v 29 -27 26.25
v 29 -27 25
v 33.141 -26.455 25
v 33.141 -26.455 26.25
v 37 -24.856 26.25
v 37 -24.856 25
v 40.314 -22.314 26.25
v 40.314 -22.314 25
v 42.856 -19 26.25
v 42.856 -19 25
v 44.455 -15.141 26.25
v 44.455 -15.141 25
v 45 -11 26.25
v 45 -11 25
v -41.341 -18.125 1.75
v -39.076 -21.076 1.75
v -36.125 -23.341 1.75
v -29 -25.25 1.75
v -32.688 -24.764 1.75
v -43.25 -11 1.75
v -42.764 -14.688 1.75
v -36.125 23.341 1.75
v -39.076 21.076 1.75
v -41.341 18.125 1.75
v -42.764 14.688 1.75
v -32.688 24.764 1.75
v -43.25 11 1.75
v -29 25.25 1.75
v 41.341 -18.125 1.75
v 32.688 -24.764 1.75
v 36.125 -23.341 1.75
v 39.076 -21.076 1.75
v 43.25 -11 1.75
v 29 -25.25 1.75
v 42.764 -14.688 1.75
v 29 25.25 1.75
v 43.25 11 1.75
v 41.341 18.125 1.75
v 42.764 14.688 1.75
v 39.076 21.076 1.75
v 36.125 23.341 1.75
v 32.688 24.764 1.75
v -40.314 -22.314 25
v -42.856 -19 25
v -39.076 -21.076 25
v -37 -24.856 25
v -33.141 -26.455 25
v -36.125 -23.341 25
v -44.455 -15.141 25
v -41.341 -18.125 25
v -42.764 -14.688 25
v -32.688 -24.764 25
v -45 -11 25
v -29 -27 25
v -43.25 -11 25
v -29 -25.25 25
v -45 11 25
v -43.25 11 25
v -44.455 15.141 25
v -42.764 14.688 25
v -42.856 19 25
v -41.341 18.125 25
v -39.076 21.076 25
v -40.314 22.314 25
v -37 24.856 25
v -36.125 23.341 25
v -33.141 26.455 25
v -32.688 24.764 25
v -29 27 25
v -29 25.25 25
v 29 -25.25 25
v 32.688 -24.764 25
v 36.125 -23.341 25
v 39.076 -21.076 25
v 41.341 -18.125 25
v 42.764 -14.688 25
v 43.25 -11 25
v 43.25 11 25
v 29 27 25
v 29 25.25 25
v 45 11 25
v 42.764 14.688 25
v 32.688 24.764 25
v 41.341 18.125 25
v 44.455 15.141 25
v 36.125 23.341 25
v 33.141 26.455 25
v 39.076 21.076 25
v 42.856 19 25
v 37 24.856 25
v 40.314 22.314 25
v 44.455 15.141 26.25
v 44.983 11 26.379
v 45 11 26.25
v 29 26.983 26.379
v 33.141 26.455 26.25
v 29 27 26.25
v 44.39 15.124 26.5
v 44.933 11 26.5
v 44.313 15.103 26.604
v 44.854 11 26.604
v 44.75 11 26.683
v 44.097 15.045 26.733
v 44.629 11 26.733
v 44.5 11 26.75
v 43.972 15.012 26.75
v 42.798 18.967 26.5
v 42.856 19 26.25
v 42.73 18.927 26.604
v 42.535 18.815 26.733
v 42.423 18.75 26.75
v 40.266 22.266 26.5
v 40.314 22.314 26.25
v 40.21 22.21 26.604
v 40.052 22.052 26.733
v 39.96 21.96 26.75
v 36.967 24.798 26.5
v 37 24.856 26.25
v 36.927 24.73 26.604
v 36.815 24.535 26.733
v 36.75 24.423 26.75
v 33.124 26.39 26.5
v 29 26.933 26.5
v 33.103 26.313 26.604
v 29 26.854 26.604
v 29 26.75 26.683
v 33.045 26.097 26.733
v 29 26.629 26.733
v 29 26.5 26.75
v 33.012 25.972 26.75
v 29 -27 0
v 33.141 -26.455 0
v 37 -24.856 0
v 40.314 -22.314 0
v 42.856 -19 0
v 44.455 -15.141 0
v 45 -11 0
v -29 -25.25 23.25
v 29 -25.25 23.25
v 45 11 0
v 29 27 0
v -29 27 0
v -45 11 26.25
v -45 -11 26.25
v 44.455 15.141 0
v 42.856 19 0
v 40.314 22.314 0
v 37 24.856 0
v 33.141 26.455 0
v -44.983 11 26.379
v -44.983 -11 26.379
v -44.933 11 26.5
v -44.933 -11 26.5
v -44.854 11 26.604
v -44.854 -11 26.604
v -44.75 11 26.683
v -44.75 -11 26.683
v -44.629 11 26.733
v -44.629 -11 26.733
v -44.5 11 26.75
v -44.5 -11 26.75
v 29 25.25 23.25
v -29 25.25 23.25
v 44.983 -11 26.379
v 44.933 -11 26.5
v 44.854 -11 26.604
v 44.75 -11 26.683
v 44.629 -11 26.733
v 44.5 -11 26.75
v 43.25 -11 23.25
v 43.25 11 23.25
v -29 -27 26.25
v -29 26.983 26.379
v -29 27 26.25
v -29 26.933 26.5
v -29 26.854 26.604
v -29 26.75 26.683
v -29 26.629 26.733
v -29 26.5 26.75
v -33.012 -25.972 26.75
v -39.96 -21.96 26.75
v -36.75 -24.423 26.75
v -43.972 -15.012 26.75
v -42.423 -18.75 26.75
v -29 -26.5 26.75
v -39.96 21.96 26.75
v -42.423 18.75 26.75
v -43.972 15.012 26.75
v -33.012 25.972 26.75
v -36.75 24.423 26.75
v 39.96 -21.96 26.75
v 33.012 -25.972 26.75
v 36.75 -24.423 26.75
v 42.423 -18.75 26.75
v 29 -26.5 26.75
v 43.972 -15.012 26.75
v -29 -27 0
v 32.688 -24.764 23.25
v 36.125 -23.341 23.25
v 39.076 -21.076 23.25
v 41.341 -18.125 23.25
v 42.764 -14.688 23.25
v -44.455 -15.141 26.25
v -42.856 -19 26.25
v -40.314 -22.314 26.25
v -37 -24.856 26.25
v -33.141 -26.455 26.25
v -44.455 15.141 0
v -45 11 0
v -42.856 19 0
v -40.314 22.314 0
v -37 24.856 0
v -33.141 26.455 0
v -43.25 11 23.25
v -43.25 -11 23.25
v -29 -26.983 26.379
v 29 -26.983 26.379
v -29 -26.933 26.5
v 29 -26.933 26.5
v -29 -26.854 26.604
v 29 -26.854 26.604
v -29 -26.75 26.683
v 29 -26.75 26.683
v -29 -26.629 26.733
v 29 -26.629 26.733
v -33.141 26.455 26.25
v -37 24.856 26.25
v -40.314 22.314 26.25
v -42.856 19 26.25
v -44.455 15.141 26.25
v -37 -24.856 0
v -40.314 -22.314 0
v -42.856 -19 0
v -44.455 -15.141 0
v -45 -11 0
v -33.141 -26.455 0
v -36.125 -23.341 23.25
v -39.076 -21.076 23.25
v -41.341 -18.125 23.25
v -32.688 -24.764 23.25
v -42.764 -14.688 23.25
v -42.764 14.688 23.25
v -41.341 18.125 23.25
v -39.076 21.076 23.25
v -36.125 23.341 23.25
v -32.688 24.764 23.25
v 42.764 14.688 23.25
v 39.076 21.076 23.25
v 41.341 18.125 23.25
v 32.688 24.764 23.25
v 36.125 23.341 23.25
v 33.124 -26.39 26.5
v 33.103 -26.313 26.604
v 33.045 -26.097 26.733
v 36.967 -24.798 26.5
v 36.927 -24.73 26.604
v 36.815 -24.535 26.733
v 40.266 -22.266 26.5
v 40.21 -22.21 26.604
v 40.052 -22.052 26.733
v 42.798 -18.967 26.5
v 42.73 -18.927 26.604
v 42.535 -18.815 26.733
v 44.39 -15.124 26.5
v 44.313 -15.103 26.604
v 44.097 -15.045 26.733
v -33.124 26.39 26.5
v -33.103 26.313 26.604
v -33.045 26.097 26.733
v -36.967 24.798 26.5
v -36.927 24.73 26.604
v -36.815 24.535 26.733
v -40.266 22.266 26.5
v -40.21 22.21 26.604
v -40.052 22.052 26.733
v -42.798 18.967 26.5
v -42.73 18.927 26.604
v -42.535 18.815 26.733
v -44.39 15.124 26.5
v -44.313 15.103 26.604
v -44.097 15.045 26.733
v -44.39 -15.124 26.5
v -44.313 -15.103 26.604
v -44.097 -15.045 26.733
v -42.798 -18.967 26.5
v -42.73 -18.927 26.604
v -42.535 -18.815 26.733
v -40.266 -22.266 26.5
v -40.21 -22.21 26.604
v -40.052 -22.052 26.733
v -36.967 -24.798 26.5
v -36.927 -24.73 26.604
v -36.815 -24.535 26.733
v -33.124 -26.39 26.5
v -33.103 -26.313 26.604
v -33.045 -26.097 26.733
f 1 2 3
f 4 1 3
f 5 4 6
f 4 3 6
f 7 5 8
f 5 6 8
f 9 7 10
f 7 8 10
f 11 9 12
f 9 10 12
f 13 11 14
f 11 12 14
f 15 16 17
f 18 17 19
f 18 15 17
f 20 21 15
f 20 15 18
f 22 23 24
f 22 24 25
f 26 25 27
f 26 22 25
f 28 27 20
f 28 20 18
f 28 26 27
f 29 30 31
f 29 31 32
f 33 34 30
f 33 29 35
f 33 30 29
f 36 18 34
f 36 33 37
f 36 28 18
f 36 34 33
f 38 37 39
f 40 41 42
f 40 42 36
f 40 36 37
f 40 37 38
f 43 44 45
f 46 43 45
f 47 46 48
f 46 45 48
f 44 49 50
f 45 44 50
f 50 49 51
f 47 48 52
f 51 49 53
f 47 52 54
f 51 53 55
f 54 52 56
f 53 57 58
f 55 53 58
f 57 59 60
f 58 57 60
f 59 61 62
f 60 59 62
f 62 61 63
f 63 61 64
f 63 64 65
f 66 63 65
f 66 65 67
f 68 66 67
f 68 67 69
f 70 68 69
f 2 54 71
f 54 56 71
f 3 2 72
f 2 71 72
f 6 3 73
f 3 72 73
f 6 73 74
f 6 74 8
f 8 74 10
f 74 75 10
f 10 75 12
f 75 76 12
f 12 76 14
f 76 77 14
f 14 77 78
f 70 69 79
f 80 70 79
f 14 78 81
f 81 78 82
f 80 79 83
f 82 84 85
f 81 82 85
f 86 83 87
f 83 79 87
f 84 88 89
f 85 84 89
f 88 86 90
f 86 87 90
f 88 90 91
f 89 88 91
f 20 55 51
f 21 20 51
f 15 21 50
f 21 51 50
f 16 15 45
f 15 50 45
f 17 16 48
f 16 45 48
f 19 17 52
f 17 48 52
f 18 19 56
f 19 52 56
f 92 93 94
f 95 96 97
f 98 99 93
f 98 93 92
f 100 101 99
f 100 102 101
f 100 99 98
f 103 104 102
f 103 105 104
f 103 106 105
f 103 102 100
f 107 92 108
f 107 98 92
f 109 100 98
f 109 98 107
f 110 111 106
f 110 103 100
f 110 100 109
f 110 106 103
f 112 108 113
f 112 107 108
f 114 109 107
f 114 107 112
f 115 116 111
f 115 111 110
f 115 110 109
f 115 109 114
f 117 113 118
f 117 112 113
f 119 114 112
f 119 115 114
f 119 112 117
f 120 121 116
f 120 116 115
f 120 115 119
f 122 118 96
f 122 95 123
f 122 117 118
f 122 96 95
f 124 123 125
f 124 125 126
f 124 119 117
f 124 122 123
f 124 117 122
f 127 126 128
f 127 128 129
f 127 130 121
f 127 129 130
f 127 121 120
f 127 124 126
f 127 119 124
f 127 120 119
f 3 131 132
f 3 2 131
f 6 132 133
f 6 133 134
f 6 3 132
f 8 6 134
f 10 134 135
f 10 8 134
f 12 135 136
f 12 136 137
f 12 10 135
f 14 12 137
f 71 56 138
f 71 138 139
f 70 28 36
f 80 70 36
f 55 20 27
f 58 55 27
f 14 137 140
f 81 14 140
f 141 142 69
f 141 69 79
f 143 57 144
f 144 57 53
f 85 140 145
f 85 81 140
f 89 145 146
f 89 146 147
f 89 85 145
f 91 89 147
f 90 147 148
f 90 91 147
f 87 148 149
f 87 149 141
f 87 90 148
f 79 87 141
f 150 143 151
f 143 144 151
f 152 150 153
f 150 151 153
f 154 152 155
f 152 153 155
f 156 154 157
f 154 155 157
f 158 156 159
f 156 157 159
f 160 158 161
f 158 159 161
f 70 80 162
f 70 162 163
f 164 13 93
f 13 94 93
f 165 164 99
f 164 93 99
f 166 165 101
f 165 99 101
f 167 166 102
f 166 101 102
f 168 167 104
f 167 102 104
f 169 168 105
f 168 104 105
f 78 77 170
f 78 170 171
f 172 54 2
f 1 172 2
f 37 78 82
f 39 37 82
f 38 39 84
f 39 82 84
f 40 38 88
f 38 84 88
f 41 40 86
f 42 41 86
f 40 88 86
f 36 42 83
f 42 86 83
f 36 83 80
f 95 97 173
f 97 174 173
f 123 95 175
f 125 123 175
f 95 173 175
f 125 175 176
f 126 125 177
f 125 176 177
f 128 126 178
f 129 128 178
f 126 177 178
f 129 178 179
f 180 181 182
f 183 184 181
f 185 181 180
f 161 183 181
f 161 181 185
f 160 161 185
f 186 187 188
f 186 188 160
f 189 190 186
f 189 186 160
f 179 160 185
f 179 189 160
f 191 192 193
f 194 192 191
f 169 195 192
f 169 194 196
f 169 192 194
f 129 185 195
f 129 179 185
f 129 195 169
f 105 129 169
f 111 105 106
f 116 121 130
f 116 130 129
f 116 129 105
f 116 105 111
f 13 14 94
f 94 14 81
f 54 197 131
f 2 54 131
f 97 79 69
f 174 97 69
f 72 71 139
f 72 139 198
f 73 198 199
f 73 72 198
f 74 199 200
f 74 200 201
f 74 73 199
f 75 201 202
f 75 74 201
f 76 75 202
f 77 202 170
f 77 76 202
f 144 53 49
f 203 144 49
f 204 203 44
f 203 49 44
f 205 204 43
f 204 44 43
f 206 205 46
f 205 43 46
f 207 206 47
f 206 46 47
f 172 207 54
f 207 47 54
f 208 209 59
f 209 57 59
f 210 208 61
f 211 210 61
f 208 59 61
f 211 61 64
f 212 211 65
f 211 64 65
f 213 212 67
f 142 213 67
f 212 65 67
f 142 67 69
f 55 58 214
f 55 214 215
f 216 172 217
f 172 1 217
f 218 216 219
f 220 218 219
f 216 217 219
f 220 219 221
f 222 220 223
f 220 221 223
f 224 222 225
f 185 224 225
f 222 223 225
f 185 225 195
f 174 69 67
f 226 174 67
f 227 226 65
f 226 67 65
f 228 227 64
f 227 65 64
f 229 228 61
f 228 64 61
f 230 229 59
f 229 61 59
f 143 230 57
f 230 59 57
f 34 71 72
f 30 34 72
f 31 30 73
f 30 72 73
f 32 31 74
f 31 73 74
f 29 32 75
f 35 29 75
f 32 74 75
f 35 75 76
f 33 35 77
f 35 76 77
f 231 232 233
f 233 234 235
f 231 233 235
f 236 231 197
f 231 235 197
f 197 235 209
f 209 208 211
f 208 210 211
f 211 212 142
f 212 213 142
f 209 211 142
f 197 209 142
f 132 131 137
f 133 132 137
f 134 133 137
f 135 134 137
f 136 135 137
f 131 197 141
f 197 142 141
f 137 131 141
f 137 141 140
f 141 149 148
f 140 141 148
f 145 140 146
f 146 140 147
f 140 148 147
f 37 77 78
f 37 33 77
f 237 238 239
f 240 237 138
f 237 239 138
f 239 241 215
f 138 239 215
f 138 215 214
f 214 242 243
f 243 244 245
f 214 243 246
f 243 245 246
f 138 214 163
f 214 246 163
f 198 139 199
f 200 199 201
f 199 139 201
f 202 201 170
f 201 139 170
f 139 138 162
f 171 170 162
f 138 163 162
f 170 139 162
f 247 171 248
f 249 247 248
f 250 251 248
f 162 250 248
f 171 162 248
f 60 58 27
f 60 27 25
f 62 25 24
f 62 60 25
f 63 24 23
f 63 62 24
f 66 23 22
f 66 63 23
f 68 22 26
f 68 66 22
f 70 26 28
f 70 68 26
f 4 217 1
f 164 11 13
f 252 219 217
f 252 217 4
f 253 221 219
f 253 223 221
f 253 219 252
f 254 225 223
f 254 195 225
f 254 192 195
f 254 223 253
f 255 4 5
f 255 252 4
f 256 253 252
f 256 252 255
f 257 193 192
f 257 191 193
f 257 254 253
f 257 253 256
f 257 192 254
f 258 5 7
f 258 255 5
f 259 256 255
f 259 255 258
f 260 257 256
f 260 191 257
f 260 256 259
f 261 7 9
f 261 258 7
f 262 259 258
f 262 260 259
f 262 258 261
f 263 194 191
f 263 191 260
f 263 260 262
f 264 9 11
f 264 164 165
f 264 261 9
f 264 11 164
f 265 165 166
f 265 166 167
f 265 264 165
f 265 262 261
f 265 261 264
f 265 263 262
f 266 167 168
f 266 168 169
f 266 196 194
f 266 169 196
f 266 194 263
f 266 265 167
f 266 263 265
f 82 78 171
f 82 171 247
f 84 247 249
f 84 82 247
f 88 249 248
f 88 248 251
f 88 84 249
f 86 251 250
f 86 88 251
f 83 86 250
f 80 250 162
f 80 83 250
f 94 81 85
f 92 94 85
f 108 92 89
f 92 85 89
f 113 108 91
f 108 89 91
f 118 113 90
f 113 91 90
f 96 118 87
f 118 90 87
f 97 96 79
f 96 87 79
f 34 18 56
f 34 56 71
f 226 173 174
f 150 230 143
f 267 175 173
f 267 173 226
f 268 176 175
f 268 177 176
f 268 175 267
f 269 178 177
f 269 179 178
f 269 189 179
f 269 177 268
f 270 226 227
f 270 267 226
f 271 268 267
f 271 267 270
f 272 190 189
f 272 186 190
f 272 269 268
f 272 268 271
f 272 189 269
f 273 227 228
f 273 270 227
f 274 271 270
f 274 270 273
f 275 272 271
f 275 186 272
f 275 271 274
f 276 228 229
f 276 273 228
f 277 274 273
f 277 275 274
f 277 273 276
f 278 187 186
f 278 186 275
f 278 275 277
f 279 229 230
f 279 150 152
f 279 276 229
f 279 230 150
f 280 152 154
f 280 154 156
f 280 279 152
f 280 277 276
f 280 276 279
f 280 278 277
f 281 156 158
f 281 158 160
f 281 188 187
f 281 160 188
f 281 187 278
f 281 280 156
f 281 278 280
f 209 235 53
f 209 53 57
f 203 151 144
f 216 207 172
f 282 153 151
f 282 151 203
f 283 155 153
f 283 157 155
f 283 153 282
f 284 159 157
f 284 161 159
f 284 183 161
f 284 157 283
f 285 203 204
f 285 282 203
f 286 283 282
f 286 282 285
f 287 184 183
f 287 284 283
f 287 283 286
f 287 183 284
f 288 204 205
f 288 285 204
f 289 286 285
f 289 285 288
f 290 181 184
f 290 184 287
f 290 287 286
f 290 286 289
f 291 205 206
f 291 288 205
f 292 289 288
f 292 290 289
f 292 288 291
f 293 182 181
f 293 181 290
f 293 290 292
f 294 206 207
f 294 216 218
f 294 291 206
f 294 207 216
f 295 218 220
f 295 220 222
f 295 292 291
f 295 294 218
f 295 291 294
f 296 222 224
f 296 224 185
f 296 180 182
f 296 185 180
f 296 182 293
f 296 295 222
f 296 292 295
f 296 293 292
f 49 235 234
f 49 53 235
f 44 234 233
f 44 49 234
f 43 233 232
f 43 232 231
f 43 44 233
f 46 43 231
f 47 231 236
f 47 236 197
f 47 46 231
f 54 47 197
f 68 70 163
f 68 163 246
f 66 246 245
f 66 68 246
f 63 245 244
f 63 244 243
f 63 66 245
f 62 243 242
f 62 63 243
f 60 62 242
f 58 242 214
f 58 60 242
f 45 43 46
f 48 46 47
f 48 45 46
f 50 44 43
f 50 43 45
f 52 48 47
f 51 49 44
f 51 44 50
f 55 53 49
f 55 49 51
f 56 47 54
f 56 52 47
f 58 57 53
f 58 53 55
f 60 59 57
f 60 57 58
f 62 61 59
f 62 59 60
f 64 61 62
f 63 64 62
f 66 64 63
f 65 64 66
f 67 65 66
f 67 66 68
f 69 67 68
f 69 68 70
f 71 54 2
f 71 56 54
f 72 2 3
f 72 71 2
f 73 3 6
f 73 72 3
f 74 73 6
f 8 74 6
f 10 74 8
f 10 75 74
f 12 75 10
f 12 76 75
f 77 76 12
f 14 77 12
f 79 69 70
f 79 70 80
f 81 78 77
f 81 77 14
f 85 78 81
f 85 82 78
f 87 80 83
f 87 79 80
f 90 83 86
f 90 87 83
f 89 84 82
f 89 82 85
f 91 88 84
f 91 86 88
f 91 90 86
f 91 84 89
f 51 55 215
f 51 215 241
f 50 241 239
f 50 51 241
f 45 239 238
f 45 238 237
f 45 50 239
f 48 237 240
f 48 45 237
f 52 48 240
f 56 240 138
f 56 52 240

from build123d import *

# Parameters (mm, degrees)
F0_W     = 90
F0_H     = 54
F1_DEPTH = 25
F2_R     = 16
F3_T     = -1.75
F5_DEPTH = 1.75
F6_DEPTH = 1.75
F7_R     = 0.5


with BuildPart() as f1:
    # F0 (on Top) → F1 (new body)
    with BuildSketch(Plane.XY):
        Rectangle(F0_W, F0_H)
    extrude(amount=F1_DEPTH)

    # F2
    f2_edges = [f1.edges().sort_by_distance(p)[0] for p in [
        (-45, -27, 12.5),
        (45, -27, 12.5),
        (45, 27, 12.5),
        (-45, 27, 12.5),
    ]]
    fillet(f2_edges, radius=F2_R)

    # F3
    f3_openings = [f1.faces().sort_by_distance(p)[0] for p in [
        (0, 0, 25),
    ]]
    offset(amount=F3_T, openings=f3_openings)


with BuildPart() as f5:
    # F4 (on face) → F5 (new body)
    with BuildSketch(Plane.XY.offset(25)):
        with BuildLine():
            Line((-43.25, 11), (-43.25, -11))
            ThreePointArc((-43.25, -11), (-39.0762716319, -21.0762716319), (-29, -25.25))
            Line((-29, -25.25), (29, -25.25))
            ThreePointArc((29, -25.25), (39.0762716319, -21.0762716319), (43.25, -11))
            Line((43.25, -11), (43.25, 11))
            ThreePointArc((43.25, 11), (39.0762716319, 21.0762716319), (29, 25.25))
            Line((29, 25.25), (-29, 25.25))
            ThreePointArc((-29, 25.25), (-39.0762716319, 21.0762716319), (-43.25, 11))
        make_face()
    extrude(amount=-F5_DEPTH)

    # F4 (on face) → F6 (join)
    with BuildSketch(Plane.XY.offset(25)):
        with BuildLine():
            Line((-29, -27), (29, -27))
            ThreePointArc((29, -27), (40.313708499, -22.313708499), (45, -11))
            Line((45, -11), (45, 11))
            ThreePointArc((45, 11), (40.313708499, 22.313708499), (29, 27))
            Line((29, 27), (-29, 27))
            ThreePointArc((-29, 27), (-40.313708499, 22.313708499), (-45, 11))
            Line((-45, 11), (-45, -11))
            ThreePointArc((-45, -11), (-40.313708499, -22.313708499), (-29, -27))
        make_face()
        with BuildLine():
            ThreePointArc((-29, -25.25), (-39.0762716319, -21.0762716319), (-43.25, -11))
            Line((-43.25, -11), (-43.25, 11))
            ThreePointArc((-43.25, 11), (-39.0762716319, 21.0762716319), (-29, 25.25))
            Line((-29, 25.25), (29, 25.25))
            ThreePointArc((29, 25.25), (39.0762716319, 21.0762716319), (43.25, 11))
            Line((43.25, 11), (43.25, -11))
            ThreePointArc((43.25, -11), (39.0762716319, -21.0762716319), (29, -25.25))
            Line((29, -25.25), (-29, -25.25))
        make_face(mode=Mode.SUBTRACT)
        with BuildLine():
            Line((-43.25, 11), (-43.25, -11))
            ThreePointArc((-43.25, -11), (-39.0762716319, -21.0762716319), (-29, -25.25))
            Line((-29, -25.25), (29, -25.25))
            ThreePointArc((29, -25.25), (39.0762716319, -21.0762716319), (43.25, -11))
            Line((43.25, -11), (43.25, 11))
            ThreePointArc((43.25, 11), (39.0762716319, 21.0762716319), (29, 25.25))
            Line((29, 25.25), (-29, 25.25))
            ThreePointArc((-29, 25.25), (-39.0762716319, 21.0762716319), (-43.25, 11))
        make_face()
    extrude(amount=F6_DEPTH)

    # F7
    f7_edges = [f5.edges().sort_by_distance(p)[0] for p in [
        (0, -27, 26.75),
        (40.313708, -22.313708, 26.75),
        (45, 0, 26.75),
        (40.313708, 22.313708, 26.75),
        (0, 27, 26.75),
        (-40.313708, 22.313708, 26.75),
        (-45, 0, 26.75),
        (-40.313708, -22.313708, 26.75),
    ]]
    fillet(f7_edges, radius=F7_R)


solid = Compound([f1.part, f5.part])
